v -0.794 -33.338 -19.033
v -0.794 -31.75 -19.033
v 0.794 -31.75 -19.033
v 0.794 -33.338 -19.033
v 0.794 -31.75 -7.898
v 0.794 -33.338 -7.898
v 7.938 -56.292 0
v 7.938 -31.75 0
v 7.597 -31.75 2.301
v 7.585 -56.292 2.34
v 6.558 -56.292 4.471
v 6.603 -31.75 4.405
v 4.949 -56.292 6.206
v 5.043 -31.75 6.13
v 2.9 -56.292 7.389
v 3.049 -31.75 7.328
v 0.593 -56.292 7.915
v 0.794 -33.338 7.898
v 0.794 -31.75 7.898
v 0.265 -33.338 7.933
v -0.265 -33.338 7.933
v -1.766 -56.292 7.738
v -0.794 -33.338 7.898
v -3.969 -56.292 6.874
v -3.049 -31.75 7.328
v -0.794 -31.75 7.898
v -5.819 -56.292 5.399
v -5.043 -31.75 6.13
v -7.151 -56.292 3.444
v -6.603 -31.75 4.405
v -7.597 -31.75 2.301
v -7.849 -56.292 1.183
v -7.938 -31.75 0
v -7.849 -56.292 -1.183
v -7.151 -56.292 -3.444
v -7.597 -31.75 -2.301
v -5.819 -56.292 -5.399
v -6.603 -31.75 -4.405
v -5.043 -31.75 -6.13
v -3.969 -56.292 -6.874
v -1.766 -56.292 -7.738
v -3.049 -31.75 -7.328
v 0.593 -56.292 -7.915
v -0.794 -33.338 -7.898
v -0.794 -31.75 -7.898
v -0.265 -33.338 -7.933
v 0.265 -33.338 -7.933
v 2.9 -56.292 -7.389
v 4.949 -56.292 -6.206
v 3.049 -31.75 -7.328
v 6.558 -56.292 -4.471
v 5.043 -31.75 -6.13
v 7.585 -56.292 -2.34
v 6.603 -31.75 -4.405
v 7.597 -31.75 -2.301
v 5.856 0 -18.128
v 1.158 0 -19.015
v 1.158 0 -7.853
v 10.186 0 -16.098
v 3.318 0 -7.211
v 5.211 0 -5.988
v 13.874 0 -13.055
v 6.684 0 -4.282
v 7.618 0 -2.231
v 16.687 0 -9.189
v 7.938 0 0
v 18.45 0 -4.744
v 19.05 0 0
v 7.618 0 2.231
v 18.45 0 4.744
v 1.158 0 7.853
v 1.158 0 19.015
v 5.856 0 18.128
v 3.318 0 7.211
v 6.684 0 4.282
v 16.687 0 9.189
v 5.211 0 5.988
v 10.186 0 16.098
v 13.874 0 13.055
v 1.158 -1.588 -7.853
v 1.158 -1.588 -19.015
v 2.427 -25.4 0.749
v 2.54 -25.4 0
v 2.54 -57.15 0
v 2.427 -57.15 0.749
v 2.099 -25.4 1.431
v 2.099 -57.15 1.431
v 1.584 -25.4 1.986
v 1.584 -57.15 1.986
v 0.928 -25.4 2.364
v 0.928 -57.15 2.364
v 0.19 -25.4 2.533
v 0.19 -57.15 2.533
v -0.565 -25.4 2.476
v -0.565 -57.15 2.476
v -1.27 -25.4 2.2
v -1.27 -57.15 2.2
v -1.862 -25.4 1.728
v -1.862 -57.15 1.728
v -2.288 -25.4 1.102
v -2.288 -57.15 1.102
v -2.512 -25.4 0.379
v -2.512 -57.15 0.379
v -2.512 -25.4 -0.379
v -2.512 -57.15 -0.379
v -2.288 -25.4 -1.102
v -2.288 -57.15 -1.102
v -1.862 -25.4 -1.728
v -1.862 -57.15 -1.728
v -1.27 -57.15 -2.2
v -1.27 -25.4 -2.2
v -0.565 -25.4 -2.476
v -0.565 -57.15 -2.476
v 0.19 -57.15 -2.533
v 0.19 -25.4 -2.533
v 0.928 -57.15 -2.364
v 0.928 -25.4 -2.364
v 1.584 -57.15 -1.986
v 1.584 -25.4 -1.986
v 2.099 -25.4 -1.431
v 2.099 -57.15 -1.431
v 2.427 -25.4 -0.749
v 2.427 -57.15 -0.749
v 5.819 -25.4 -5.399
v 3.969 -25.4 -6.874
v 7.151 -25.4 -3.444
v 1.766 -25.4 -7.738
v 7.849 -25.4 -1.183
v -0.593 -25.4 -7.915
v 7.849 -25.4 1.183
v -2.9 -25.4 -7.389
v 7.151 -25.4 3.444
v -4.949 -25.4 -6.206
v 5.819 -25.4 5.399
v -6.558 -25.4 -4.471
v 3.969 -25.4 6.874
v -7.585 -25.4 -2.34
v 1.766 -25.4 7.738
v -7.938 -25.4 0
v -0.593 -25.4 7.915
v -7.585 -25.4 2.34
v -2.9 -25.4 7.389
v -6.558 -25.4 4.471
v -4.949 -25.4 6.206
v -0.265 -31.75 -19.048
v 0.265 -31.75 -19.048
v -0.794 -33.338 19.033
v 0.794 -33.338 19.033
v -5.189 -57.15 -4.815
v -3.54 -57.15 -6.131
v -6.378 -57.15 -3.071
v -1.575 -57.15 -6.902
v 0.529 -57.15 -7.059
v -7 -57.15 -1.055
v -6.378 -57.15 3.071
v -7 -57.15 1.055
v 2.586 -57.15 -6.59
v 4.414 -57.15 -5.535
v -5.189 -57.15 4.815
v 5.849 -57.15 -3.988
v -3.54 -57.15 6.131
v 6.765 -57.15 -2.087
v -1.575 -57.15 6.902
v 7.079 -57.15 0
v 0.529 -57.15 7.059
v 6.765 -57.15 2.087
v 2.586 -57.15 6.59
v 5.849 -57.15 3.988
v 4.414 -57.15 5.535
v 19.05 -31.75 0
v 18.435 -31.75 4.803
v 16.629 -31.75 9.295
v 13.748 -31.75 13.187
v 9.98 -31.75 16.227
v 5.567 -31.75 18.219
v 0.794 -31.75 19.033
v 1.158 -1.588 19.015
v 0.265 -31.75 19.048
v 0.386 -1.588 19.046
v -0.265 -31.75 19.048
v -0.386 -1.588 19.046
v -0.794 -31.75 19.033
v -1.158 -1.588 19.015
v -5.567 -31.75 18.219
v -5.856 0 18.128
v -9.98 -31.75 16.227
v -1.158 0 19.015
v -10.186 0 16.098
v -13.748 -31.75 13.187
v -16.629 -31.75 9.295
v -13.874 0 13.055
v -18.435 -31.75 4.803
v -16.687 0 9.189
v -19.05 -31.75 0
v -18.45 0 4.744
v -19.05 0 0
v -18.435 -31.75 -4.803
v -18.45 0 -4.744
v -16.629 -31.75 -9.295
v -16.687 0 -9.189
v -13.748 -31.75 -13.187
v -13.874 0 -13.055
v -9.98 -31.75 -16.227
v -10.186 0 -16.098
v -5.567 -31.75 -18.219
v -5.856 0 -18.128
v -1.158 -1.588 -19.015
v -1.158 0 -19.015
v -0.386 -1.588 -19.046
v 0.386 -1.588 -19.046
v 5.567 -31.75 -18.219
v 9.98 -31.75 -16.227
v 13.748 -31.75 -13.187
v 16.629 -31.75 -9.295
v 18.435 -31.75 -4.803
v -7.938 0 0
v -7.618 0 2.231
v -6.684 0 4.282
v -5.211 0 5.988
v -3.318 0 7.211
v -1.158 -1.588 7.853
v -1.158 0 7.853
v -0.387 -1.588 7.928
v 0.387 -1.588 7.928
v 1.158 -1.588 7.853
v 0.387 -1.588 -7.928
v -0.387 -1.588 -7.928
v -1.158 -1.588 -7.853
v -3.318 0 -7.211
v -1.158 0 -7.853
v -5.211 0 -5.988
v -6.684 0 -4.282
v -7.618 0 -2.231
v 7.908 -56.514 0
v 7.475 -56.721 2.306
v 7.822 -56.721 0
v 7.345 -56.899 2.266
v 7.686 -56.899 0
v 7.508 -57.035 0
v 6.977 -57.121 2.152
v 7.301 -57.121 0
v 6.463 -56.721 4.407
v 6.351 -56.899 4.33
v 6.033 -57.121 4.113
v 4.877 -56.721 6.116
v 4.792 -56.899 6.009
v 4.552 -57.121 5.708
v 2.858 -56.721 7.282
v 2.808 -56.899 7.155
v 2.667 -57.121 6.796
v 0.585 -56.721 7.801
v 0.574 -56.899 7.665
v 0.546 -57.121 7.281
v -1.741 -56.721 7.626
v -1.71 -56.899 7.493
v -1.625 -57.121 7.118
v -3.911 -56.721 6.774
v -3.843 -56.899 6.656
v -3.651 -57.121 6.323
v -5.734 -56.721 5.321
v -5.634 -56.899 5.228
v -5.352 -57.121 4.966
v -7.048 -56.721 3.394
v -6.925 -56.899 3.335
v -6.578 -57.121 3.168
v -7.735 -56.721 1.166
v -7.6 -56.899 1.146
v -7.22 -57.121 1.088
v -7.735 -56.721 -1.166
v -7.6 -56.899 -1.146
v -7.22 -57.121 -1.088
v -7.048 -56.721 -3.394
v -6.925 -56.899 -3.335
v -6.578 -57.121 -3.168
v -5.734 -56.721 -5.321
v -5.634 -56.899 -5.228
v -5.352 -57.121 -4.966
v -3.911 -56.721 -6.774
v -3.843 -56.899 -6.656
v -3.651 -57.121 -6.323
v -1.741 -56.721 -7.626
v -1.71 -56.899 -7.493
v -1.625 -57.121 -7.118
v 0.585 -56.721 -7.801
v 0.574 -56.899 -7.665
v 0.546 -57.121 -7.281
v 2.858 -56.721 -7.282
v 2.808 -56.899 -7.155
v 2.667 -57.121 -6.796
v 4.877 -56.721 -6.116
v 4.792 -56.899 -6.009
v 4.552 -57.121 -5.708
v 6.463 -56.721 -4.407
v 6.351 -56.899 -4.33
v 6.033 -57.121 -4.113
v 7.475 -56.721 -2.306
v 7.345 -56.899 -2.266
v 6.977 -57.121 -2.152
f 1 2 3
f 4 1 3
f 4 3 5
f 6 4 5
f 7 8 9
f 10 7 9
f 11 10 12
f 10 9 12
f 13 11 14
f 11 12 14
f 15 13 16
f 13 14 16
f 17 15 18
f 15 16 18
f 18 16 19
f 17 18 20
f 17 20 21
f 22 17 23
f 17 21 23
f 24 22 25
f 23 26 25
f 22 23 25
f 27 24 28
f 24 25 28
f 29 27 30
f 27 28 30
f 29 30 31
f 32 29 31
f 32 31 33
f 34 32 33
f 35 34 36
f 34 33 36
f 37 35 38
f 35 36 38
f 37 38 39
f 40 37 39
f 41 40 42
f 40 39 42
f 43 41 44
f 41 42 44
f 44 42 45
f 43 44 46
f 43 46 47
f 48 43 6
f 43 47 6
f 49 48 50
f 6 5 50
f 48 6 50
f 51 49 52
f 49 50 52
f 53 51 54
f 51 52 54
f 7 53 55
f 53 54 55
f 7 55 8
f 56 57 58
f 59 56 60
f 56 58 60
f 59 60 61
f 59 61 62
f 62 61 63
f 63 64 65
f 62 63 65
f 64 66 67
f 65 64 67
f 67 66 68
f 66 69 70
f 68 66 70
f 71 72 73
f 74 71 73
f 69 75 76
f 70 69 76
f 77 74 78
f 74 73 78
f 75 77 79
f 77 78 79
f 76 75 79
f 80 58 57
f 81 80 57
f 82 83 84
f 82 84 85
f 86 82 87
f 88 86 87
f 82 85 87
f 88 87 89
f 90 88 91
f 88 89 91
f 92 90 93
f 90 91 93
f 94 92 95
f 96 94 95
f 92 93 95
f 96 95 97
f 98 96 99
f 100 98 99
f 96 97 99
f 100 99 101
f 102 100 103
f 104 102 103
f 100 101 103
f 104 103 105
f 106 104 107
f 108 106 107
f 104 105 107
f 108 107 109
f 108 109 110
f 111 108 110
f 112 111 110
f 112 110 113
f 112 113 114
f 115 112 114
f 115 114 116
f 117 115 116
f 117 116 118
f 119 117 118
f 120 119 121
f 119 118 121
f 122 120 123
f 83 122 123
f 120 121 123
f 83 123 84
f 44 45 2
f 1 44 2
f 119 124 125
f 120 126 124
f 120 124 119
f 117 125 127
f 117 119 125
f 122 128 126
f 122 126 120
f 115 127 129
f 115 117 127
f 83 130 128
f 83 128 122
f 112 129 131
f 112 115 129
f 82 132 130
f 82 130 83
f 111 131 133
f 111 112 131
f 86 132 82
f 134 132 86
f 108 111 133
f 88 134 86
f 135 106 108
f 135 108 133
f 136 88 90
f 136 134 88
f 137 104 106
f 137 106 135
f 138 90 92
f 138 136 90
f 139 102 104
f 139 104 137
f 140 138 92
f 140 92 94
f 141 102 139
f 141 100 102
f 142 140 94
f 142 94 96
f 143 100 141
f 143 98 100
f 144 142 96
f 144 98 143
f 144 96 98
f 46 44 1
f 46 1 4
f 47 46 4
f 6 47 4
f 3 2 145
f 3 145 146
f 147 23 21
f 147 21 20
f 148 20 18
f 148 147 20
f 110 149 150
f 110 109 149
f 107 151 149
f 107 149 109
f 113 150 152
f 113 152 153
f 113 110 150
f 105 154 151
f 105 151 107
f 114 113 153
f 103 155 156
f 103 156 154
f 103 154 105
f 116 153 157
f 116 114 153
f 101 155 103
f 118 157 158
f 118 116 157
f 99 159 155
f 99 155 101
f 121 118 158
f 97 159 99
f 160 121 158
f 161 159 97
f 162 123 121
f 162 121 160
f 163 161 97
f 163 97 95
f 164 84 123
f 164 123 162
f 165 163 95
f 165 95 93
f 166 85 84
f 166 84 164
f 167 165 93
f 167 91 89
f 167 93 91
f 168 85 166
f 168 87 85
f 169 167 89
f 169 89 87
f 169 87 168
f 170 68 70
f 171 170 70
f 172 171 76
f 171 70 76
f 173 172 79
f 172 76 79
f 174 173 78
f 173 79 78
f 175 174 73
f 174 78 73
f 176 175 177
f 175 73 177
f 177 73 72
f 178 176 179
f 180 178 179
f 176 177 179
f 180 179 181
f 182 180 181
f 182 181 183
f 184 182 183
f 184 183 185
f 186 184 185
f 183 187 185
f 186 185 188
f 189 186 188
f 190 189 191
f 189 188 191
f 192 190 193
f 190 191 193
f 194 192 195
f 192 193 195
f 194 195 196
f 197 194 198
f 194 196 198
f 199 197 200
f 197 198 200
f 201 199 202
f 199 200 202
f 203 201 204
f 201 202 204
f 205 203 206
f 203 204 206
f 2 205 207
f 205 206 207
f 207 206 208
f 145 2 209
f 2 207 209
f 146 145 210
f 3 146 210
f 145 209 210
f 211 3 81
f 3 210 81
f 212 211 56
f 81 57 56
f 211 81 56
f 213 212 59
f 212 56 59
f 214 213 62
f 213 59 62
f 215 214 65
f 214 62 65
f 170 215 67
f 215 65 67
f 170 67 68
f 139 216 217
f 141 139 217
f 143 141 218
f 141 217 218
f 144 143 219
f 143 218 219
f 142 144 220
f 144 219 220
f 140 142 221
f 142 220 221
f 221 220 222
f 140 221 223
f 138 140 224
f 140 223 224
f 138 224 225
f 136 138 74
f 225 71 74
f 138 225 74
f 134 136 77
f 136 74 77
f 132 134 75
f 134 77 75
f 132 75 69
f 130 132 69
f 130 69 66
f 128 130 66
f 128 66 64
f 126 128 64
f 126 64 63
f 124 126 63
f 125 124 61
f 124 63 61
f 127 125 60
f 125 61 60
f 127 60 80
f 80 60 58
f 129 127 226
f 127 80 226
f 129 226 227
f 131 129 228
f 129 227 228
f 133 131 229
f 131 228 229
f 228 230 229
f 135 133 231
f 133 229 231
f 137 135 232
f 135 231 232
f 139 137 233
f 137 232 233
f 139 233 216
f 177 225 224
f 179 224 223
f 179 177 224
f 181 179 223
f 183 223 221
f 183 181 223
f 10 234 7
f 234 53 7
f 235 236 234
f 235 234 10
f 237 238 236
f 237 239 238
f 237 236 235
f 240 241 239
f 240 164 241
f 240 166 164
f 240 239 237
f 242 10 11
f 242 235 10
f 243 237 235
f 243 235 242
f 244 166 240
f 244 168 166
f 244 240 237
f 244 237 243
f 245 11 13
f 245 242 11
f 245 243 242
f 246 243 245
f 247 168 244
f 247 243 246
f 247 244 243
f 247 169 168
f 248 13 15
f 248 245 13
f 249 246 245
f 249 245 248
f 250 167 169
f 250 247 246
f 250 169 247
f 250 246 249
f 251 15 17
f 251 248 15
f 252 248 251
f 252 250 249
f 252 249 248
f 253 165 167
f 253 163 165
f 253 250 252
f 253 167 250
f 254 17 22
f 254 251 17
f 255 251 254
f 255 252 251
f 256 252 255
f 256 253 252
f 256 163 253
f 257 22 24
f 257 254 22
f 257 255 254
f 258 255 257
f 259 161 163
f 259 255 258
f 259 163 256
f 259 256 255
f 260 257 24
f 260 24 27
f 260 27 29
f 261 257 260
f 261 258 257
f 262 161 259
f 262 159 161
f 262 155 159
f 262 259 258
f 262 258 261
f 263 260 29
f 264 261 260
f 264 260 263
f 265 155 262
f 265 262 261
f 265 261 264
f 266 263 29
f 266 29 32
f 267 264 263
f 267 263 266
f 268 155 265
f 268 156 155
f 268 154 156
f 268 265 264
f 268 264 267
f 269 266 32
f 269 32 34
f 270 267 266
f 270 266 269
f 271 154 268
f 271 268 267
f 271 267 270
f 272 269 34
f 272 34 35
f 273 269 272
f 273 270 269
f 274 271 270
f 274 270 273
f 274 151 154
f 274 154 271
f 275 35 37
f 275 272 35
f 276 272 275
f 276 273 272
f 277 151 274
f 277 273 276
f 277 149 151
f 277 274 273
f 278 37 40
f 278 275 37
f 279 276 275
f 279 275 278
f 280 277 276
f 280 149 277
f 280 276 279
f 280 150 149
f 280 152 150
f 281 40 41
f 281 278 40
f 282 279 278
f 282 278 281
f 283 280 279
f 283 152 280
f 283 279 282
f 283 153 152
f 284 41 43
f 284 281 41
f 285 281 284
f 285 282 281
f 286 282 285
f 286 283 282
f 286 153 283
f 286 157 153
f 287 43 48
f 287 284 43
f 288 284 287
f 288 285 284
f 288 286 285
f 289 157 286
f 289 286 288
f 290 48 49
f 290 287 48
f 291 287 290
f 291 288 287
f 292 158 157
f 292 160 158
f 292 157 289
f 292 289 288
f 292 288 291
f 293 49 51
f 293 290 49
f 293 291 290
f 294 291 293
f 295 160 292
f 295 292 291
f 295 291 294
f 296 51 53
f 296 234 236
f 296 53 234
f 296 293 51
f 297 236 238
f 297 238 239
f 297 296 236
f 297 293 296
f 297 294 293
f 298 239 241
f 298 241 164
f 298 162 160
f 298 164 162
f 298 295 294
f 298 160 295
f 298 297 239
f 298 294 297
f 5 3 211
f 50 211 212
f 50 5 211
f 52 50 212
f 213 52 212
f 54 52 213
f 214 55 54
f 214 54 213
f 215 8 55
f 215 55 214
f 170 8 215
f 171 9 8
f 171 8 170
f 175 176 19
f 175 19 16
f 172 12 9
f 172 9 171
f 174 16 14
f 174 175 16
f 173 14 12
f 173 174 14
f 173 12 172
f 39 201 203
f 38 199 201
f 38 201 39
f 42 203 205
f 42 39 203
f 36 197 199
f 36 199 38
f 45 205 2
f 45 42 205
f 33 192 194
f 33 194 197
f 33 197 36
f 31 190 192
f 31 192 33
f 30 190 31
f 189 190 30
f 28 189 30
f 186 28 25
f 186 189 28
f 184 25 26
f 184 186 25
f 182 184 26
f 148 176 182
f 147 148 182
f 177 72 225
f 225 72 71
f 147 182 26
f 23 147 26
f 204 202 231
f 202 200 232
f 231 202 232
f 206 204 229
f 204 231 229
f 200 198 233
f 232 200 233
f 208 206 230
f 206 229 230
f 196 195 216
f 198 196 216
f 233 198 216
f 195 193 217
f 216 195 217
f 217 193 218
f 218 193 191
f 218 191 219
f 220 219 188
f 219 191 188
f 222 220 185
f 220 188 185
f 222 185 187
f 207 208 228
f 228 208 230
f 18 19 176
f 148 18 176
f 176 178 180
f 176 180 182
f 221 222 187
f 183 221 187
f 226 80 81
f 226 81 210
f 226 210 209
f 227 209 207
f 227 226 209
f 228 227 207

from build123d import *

# Parameters (mm, degrees)
F0_R      = 19.05
F1_DEPTH  = 31.75
F2_R      = 7.9375
F3_DEPTH  = 25.4
F4_R      = 0.8584943428
F6_DEPTH  = 1.5875
F8_DEPTH  = 1.5875
F11_R     = 7.9375
F12_DEPTH = 25.4
F9_R      = 2.54
F13_DEPTH = 31.75
F14_DEPTH = 1.5875


with BuildPart() as f1:
    # F0 (on Front) → F1 (new body)
    with BuildSketch(Plane.XZ):
        Circle(F0_R)
    extrude(amount=F1_DEPTH)

    # F2 (on face) → F3 (join)
    with BuildSketch(Plane.XZ.offset(31.75)):
        Circle(F2_R)
    extrude(amount=F3_DEPTH)

    # F4
    f4_edges = [f1.edges().sort_by_distance(p)[0] for p in [
        (-7.9375, -57.15, 0),
    ]]
    fillet(f4_edges, radius=F4_R)

    # F5 (on face) → F6 (join)
    with BuildSketch(Plane.XZ.offset(31.75)):
        with BuildLine():
            Line((0.79375, 19.0334563581), (-0.79375, 19.0334563581))
            Line((-0.79375, 19.0334563581), (-0.79375, 7.897712782))
            ThreePointArc((-0.79375, 7.897712782), (0, 7.9375), (0.79375, 7.897712782))
            Line((0.79375, 7.897712782), (0.79375, 19.0334563581))
        make_face()
    extrude(amount=F6_DEPTH)

    # F7 (on face) → F8 (join)
    with BuildSketch(Plane.XZ.offset(31.75)):
        with BuildLine():
            Line((-0.79375, -7.897712782), (-0.79375, -19.0334563581))
            Line((-0.79375, -19.0334563581), (0.79375, -19.0334563581))
            Line((0.79375, -19.0334563581), (0.79375, -7.897712782))
            ThreePointArc((0.79375, -7.897712782), (0, -7.9375), (-0.79375, -7.897712782))
        make_face()
    extrude(amount=F8_DEPTH)

    # F11 (on face) → F12 (cut)
    with BuildSketch(Plane(origin=(0, 0, 0), x_dir=(-1, 0, 0), z_dir=(0, 1, 0))):
        Circle(F11_R)
    extrude(amount=-F12_DEPTH, mode=Mode.SUBTRACT)

    # F9 (on face) → F13 (cut)
    with BuildSketch(Plane.XZ.offset(57.15)):
        Circle(F9_R)
    extrude(amount=-F13_DEPTH, mode=Mode.SUBTRACT)

    # F10 (on face) → F14 (cut)
    with BuildSketch(Plane(origin=(0, 0, 0), x_dir=(-1, 0, 0), z_dir=(0, 1, 0))):
        with BuildLine():
            ThreePointArc((1.1575095176, 19.0148013851), (0, 19.05), (-1.1575095176, 19.0148013851))
            Line((-1.1575095176, 19.0148013851), (-1.1575095176, -19.0148013851))
            ThreePointArc((-1.1575095176, -19.0148013851), (0, -19.05), (1.1575095176, -19.0148013851))
            Line((1.1575095176, -19.0148013851), (1.1575095176, 19.0148013851))
        make_face()
    extrude(amount=-F14_DEPTH, mode=Mode.SUBTRACT)


solid = f1.part
